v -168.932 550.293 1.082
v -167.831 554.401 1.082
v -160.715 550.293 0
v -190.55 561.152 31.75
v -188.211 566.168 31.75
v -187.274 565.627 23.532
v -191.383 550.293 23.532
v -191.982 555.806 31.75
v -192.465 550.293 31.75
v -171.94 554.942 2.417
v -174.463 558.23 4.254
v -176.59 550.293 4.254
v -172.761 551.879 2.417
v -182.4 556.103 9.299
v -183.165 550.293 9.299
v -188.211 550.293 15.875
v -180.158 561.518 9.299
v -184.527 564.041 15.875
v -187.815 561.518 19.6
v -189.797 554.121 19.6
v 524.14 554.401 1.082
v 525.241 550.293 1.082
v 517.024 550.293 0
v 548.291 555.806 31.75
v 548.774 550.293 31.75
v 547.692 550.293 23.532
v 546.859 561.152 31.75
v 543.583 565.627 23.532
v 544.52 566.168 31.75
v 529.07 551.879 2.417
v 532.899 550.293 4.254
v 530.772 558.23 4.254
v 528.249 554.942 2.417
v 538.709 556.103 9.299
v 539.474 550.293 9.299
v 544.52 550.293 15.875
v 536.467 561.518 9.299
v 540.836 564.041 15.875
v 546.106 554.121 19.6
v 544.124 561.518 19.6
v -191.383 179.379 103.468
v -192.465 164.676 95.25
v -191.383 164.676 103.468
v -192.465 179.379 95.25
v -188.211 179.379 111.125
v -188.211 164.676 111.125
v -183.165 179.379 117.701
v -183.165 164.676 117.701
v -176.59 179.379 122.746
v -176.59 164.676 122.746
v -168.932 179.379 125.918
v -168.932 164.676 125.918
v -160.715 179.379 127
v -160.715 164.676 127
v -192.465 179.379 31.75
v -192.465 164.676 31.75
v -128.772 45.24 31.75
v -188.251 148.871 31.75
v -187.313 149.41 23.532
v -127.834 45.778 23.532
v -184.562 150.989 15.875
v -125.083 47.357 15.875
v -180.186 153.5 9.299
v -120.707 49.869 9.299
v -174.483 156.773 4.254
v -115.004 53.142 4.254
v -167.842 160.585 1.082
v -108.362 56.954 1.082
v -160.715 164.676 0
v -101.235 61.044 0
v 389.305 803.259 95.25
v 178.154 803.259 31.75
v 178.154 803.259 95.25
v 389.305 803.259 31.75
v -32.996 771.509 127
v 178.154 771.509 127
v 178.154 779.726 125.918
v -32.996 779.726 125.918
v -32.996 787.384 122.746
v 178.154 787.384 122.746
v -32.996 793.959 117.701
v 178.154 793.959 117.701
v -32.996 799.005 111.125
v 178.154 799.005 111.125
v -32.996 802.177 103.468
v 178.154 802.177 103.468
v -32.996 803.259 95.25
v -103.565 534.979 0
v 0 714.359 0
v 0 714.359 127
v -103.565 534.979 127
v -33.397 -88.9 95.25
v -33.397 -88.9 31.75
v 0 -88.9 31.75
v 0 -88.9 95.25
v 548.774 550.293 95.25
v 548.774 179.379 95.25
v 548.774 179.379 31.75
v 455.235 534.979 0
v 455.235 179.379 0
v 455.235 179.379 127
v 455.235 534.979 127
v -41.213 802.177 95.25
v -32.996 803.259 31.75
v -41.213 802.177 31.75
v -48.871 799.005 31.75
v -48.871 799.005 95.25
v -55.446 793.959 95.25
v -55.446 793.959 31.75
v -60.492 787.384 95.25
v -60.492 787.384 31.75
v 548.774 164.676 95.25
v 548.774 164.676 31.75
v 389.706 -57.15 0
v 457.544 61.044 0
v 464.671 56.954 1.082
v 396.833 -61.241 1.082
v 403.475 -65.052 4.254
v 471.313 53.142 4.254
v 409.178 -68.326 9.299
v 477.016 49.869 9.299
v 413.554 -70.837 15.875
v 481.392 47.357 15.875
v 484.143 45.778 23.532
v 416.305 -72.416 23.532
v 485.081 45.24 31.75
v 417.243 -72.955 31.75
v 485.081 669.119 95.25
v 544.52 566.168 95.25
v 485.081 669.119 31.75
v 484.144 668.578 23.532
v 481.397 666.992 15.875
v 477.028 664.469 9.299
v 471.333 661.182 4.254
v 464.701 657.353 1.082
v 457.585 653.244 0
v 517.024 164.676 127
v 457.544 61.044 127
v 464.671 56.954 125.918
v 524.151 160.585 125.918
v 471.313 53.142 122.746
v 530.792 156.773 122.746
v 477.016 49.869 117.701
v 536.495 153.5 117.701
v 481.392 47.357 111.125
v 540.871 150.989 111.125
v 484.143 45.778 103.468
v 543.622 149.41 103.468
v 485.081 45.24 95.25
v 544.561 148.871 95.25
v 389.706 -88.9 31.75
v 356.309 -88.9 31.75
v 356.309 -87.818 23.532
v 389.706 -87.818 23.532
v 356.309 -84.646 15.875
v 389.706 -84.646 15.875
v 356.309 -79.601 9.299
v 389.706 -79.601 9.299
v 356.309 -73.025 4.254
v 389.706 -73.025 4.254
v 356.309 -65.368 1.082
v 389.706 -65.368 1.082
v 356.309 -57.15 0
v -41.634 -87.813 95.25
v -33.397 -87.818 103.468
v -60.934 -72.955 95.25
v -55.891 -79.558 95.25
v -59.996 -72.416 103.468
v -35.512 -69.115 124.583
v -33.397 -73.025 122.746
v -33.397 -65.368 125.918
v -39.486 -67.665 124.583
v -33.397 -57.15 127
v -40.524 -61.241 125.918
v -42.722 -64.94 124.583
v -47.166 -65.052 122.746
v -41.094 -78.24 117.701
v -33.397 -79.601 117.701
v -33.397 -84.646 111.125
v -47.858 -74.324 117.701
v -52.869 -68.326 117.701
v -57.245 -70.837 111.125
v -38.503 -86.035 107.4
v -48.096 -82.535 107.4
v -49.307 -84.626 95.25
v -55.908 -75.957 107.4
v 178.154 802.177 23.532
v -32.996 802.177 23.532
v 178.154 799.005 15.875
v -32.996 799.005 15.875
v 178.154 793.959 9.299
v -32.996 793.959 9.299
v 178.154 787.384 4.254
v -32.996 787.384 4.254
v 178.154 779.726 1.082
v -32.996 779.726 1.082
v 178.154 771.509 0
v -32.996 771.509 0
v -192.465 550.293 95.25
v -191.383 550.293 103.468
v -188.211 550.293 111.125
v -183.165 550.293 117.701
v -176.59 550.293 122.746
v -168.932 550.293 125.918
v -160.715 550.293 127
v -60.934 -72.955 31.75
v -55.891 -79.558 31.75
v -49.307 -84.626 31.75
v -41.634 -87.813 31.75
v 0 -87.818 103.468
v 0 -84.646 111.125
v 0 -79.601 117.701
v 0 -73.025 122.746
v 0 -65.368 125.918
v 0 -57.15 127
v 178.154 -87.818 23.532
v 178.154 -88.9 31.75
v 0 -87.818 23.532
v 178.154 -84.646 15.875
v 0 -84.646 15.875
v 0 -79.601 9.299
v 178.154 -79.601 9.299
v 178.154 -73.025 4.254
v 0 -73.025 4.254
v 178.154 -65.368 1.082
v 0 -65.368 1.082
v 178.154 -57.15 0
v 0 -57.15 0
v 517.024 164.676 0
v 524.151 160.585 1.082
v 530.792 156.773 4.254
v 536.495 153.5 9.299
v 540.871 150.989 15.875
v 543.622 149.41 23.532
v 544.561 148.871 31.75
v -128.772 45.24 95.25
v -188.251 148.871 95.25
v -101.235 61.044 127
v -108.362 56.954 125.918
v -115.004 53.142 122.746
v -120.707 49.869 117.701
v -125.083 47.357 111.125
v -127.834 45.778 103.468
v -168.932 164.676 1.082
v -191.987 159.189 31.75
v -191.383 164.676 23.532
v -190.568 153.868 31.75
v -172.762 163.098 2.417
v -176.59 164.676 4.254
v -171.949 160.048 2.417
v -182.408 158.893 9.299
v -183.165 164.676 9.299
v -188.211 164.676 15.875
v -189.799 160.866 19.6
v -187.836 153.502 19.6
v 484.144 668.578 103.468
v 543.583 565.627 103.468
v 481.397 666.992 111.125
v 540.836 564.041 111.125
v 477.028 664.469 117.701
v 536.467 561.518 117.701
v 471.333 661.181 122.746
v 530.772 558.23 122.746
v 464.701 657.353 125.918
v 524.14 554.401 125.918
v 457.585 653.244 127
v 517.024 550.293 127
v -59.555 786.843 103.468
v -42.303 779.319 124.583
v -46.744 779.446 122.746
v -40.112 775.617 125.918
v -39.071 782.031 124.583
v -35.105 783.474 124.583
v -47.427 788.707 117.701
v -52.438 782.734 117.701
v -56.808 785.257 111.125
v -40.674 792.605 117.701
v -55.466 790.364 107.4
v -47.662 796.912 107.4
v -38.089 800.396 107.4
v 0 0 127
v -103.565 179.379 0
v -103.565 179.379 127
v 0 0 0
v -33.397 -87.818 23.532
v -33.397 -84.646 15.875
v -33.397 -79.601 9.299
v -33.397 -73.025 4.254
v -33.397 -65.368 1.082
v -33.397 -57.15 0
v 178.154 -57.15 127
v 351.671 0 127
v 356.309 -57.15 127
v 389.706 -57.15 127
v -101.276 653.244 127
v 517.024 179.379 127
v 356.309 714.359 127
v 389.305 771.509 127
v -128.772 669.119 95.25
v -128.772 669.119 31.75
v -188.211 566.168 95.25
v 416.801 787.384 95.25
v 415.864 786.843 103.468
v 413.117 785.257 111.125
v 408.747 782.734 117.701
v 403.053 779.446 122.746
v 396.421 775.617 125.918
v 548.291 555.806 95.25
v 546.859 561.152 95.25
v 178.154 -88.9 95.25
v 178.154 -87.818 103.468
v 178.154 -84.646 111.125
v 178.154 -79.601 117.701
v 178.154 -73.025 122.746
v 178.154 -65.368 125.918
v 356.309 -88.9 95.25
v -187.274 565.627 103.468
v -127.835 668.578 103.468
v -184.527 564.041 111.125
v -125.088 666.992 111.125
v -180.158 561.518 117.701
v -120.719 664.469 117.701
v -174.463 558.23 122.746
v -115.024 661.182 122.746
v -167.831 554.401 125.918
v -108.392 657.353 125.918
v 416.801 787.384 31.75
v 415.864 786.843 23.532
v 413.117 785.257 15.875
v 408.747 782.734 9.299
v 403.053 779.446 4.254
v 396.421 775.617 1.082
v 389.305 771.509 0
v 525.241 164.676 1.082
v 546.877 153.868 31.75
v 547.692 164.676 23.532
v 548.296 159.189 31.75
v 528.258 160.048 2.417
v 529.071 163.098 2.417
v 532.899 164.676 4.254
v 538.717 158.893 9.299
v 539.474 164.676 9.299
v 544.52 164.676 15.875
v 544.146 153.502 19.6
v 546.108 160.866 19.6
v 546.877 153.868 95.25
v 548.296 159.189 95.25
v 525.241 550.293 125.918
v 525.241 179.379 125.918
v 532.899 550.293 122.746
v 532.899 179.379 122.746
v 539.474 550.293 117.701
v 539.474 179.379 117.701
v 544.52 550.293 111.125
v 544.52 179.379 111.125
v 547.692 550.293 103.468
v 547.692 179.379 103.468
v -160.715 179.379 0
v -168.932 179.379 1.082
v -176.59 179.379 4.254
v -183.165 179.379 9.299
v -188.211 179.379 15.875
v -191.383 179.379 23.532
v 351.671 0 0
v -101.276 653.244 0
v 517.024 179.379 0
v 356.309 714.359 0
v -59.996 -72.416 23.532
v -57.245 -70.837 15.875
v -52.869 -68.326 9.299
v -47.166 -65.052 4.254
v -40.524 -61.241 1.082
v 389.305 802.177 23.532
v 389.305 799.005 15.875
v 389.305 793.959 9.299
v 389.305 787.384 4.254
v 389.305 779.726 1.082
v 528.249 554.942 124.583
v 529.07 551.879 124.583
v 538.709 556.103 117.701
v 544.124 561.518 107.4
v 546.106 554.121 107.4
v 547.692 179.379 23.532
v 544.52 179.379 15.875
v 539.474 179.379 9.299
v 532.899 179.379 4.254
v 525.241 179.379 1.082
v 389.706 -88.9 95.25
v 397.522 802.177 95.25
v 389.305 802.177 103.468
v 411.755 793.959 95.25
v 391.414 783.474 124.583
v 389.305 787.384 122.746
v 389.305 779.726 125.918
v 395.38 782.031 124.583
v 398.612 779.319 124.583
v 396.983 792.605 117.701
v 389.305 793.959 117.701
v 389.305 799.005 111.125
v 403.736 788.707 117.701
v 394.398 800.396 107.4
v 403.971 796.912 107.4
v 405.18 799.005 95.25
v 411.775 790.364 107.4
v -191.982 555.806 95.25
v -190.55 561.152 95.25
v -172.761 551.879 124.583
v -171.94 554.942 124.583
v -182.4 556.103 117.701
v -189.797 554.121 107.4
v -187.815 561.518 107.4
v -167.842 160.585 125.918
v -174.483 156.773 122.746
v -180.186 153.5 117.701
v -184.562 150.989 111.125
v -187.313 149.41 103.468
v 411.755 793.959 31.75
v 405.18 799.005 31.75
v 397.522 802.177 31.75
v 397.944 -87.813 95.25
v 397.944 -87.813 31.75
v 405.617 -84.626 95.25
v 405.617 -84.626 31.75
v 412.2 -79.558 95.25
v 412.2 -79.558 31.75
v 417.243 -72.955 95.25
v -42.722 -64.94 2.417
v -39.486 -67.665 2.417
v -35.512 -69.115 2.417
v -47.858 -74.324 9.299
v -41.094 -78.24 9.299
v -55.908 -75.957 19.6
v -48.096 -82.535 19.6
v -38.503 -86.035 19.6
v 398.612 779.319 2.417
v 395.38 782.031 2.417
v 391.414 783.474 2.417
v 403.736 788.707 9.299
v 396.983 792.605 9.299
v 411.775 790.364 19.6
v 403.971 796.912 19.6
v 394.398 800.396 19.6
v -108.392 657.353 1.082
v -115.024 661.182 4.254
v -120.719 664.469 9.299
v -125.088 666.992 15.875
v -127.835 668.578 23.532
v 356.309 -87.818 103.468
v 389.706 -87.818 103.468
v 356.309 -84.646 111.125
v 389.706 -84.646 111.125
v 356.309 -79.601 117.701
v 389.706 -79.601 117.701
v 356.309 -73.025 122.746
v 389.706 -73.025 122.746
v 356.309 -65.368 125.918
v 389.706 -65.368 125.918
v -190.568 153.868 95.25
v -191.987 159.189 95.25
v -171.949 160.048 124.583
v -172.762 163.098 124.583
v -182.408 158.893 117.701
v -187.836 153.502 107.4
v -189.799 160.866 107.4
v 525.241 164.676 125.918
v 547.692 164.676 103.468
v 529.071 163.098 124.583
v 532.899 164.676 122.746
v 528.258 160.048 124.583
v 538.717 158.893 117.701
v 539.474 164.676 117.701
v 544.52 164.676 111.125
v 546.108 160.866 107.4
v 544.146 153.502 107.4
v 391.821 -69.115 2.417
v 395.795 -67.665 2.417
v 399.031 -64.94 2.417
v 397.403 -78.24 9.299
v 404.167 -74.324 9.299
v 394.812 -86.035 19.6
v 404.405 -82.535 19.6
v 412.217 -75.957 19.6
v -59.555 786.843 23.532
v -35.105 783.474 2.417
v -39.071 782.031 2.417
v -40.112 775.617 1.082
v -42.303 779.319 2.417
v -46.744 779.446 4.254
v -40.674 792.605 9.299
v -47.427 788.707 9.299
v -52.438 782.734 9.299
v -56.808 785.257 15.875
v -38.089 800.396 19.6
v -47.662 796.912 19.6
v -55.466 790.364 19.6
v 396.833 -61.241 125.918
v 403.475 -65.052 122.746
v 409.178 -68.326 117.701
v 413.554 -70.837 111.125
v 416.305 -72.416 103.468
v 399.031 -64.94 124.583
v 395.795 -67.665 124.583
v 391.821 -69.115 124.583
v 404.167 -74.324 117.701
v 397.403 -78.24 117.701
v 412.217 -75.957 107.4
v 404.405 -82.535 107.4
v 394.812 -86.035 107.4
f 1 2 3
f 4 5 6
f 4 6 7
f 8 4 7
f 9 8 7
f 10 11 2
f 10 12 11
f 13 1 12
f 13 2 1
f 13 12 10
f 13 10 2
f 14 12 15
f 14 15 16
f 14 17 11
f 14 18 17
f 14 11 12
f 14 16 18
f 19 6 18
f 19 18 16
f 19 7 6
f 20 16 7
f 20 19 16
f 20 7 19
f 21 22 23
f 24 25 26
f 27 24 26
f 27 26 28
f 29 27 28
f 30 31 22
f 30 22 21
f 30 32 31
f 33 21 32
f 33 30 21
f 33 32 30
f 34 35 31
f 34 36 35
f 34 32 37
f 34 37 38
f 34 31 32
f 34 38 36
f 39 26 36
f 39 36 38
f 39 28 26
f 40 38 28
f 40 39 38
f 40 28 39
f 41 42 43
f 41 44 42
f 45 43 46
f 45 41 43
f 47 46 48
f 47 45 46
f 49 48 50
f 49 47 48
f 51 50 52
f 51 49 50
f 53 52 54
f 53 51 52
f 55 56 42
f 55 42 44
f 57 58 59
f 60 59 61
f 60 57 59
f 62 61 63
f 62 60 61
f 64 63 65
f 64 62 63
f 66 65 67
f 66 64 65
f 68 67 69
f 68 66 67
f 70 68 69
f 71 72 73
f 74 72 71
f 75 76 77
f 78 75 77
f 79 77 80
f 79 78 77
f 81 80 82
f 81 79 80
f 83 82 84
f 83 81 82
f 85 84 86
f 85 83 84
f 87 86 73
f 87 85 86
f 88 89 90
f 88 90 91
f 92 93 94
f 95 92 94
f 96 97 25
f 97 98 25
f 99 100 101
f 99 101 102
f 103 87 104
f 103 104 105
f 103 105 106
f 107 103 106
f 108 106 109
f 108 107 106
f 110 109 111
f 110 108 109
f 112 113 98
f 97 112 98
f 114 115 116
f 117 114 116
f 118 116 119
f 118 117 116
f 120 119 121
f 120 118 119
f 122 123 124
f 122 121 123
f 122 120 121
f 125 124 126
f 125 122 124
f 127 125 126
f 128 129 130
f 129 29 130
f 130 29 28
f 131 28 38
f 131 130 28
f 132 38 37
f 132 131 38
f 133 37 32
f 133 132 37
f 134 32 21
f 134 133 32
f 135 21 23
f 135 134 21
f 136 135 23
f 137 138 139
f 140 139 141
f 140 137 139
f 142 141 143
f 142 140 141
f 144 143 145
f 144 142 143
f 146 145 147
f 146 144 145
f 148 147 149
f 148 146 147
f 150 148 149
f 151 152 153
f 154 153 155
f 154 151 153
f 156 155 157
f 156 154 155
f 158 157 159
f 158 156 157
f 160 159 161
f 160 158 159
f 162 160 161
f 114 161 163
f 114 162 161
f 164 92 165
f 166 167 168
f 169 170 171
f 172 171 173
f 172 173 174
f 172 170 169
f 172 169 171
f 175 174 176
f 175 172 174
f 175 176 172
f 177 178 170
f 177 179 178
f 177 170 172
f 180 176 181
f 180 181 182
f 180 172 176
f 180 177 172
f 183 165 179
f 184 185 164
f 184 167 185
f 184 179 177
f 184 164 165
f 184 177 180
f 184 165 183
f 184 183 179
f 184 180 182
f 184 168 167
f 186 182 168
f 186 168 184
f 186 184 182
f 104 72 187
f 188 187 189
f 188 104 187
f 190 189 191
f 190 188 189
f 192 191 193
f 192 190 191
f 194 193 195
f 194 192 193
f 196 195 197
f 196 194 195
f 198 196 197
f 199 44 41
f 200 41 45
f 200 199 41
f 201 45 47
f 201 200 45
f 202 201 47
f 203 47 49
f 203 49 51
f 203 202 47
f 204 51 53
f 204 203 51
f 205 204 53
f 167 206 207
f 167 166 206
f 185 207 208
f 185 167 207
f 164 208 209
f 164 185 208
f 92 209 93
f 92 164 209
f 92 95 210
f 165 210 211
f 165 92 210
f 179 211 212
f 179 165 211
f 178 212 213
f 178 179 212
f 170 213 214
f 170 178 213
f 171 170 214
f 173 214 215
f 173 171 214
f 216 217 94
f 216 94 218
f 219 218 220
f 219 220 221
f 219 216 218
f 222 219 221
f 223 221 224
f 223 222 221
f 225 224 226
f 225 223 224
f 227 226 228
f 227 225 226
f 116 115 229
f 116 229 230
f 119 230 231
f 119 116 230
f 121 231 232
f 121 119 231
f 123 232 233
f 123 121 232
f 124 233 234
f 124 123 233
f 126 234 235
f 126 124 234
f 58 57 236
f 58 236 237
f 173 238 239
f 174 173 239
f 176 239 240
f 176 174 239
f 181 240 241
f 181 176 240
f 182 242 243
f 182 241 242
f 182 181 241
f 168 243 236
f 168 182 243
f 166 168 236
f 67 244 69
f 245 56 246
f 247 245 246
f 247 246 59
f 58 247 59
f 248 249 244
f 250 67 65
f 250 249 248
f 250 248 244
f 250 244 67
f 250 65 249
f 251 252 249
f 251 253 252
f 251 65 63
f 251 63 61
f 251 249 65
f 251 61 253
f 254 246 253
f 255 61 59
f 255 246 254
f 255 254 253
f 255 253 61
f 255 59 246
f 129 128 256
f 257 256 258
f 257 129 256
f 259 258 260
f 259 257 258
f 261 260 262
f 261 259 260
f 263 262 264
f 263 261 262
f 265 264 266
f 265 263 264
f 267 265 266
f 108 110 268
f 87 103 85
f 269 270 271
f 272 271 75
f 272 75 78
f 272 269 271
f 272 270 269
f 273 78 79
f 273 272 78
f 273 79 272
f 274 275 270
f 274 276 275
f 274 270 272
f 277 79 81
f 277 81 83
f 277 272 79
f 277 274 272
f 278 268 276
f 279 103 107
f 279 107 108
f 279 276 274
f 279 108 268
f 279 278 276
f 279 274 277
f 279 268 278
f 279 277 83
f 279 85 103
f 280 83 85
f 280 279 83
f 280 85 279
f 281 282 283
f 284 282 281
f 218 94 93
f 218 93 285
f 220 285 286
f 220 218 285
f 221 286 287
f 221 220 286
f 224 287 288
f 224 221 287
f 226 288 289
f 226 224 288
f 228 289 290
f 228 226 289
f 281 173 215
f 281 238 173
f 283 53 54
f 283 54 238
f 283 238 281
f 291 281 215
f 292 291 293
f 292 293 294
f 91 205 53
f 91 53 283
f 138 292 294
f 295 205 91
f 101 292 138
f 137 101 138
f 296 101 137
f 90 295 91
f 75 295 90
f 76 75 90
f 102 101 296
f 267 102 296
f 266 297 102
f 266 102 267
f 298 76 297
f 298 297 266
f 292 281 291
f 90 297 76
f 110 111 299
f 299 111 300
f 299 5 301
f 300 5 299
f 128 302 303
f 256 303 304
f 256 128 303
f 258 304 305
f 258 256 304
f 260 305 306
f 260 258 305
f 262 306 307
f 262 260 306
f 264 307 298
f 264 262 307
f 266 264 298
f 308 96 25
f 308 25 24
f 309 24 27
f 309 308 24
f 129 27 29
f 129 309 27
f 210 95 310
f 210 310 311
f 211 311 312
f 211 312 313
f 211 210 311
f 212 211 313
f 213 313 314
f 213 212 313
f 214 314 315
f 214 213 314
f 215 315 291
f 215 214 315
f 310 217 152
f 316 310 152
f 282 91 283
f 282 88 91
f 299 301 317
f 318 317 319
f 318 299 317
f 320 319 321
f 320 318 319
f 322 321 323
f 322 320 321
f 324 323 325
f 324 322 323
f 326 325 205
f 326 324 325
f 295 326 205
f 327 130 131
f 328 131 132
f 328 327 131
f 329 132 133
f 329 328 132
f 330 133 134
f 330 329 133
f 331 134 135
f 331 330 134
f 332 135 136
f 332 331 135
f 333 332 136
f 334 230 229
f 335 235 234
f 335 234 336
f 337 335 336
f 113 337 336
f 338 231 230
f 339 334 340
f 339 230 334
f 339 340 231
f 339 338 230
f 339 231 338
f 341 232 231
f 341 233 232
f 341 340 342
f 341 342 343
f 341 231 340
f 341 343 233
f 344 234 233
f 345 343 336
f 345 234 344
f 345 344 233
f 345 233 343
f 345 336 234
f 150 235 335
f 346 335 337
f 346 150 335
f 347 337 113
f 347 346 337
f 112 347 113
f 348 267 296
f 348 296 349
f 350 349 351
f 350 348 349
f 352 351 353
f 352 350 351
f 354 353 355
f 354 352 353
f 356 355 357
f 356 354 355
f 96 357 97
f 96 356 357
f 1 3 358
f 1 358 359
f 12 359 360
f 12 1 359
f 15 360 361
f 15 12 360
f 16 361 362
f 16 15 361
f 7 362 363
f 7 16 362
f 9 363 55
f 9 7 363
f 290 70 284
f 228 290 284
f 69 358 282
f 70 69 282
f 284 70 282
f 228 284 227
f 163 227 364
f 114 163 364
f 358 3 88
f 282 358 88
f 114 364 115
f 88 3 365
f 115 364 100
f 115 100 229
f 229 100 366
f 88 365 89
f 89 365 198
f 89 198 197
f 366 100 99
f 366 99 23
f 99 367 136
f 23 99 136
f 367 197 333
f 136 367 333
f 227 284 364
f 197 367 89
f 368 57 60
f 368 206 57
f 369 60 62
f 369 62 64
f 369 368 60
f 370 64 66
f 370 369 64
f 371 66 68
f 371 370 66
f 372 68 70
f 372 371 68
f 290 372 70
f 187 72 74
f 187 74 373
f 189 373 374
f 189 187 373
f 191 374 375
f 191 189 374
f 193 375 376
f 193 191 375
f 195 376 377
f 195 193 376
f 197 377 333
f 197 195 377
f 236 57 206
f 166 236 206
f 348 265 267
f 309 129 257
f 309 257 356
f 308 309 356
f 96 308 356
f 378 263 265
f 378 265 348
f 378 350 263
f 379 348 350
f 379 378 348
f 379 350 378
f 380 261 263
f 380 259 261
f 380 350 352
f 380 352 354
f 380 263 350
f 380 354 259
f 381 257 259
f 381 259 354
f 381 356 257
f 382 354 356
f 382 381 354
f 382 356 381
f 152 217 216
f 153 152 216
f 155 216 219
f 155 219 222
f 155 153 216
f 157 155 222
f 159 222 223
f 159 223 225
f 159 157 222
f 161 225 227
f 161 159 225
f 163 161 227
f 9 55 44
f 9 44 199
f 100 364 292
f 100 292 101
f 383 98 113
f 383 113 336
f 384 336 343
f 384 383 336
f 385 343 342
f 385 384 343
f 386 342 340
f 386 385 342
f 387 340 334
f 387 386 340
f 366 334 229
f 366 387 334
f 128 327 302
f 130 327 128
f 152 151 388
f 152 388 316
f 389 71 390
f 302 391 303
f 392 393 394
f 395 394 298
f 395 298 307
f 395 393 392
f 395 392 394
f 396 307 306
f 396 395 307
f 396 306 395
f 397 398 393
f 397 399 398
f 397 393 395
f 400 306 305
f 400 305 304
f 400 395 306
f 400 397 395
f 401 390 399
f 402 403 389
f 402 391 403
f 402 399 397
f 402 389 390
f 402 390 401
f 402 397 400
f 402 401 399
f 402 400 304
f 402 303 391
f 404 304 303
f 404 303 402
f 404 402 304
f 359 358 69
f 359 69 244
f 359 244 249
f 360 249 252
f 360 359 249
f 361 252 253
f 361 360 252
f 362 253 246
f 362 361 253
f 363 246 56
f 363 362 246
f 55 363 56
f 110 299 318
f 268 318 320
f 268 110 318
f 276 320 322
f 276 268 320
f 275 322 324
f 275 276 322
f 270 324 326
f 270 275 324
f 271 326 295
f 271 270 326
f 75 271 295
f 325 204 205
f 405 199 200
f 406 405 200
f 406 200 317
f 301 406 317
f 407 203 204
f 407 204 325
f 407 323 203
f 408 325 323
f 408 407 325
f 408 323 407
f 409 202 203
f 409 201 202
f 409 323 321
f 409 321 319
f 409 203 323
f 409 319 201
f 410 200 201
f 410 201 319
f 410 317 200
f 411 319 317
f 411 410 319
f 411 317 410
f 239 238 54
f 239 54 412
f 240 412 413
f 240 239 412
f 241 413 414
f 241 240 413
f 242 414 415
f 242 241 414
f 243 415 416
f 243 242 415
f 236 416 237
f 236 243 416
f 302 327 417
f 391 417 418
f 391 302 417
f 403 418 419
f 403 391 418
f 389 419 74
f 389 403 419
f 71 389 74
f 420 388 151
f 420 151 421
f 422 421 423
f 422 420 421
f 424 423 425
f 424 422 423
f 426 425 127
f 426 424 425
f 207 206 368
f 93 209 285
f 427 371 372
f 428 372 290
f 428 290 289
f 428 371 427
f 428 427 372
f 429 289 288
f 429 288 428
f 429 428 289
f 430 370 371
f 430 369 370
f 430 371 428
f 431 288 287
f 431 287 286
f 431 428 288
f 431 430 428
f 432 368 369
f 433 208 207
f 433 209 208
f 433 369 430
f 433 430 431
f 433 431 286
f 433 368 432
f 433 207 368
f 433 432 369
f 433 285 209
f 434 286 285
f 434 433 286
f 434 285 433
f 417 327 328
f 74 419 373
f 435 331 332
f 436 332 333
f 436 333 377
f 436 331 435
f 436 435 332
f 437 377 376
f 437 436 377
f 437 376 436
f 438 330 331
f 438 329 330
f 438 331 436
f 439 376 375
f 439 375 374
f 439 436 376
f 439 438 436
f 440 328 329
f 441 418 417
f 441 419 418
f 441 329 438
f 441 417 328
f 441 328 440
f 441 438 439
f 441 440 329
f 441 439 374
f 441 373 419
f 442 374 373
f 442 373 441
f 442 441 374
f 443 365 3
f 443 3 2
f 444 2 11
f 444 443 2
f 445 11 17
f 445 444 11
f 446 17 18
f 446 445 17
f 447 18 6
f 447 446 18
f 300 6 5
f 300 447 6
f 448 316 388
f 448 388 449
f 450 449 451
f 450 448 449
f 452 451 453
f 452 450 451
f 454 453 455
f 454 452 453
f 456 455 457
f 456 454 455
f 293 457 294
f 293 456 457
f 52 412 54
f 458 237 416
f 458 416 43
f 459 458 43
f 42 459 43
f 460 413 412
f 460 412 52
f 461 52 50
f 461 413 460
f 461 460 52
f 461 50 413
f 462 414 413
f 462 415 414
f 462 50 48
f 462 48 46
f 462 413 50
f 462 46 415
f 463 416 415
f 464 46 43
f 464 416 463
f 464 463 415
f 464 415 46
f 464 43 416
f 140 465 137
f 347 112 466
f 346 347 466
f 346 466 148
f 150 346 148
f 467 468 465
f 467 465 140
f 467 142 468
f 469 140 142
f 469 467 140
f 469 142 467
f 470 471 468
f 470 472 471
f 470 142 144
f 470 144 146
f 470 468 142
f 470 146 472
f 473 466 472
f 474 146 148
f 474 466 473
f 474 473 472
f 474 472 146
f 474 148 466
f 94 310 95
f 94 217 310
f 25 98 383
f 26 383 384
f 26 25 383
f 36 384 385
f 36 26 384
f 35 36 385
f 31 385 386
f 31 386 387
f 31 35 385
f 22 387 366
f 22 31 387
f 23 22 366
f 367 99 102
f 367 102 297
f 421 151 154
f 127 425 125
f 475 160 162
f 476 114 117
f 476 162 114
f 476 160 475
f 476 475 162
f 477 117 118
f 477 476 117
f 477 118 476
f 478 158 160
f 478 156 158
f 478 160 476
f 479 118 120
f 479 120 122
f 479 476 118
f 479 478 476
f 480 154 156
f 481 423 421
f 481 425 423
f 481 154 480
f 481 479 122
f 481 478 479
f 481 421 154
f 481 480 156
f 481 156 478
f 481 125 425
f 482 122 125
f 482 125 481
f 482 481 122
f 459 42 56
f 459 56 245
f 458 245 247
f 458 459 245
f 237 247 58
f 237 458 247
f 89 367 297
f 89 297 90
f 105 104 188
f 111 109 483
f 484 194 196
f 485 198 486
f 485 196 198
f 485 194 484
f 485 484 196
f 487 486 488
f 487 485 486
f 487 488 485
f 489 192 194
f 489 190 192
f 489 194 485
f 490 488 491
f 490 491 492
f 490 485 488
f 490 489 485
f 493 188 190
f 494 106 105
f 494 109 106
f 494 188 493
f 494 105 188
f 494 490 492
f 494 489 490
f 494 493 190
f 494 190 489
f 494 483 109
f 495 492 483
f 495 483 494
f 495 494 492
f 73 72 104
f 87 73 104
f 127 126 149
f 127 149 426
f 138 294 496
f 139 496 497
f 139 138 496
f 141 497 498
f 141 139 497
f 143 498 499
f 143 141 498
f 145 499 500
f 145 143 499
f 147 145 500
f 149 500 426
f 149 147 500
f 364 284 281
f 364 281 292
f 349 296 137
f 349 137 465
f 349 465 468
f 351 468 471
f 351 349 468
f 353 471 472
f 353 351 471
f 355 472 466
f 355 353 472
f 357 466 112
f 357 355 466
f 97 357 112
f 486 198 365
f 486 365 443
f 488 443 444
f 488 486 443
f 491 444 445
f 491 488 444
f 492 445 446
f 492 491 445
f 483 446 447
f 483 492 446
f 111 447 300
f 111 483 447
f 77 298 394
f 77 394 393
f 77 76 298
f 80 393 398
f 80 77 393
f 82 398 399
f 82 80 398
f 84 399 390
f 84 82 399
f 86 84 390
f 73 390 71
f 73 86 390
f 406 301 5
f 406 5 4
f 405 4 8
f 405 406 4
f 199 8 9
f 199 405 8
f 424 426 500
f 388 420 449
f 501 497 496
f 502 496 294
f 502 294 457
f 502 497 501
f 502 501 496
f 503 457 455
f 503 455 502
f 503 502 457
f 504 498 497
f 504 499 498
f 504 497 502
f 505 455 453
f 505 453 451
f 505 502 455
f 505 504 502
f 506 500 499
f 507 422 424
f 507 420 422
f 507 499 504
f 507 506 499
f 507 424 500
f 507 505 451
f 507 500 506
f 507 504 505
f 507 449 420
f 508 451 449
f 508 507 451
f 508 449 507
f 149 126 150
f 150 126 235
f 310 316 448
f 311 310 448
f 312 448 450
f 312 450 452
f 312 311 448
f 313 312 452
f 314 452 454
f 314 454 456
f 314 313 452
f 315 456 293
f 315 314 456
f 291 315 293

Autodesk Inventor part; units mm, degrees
ref_plane "YZ Plane" through (0, 0, 0) normal (1, 0, 0) x (0, 1, 0)
ref_plane "XZ Plane" through (0, 0, 0) normal (0, 1, 0) x (-1, 0, 0)
ref_plane "XY Plane" through (0, 0, 0) normal (0, 0, 1) x (1, 0, 0)
sketch "Sketch1" plane through (0, 0, 0) normal (0, 0, 1) x (1, 0, 0)
  line L0 (0, 0) -> (351.6706, 0)
  line L1 (-103.5647, 179.3793) -> (0, 0)
  line L2 (351.6706, 0) -> (455.2353, 179.3793)
  line L3 (455.2353, 179.3793) -> (455.2353, 534.9793)
  line L4 (-103.5647, 534.9793) -> (-103.5647, 179.3793)
  line L5 (0, 714.3586) -> (-103.5647, 534.9793)
  line L6 (356.3091, 714.3586) -> (0, 714.3586)
  line L7 (455.2353, 534.9793) -> (356.3091, 714.3586)
  line L8 (-103.5647, 179.3793) -> (-192.4647, 179.3793) construction
  line L9 (-51.7823, 89.6897) -> (-128.772, 45.2397) construction
  line L10 (-128.772, 45.2397) -> (-51.7823, -88.9)
  line L11 (-51.7823, -88.9) -> (0, -88.9)
  line L12 (178.1545, -88.9) -> (178.1545, 714.3586) construction
  line L13 (178.1545, -88.9) -> (0, -88.9)
  line L14 (-128.772, 45.2397) -> (-192.4647, 156.2119)
  line L15 (-192.4647, 156.2119) -> (-192.4647, 179.3793)
  line L16 (178.1545, 714.3586) -> (178.1545, 803.2586) construction
  line L17 (-51.7823, 624.669) -> (-128.772, 669.119) construction
  line L18 (-192.4647, 179.3793) -> (-192.4647, 558.8)
  line L19 (-192.4647, 558.8) -> (-128.772, 669.119)
  line L20 (178.1545, 803.2586) -> (-51.3264, 803.2586)
  line L21 (-51.3264, 803.2586) -> (-128.772, 669.119)
  line L22 (485.0811, 45.2397) -> (408.0914, -88.9)
  line L23 (178.1545, -88.9) -> (356.3091, -88.9)
  line L24 (485.0811, 45.2397) -> (548.7738, 156.2119)
  line L25 (548.7738, 156.2119) -> (548.7738, 179.3793)
  line L26 (408.0914, 624.669) -> (485.0811, 669.119) construction
  line L27 (548.7738, 179.3793) -> (548.7738, 558.8)
  line L28 (548.7738, 558.8) -> (485.0811, 669.119)
  line L29 (178.1545, 803.2586) -> (407.6355, 803.2586)
  line L30 (407.6355, 803.2586) -> (485.0811, 669.119)
  line L31 (408.0914, -88.9) -> (356.3091, -88.9)
  point P0 (175.8353, 357.1793)
  dimension "d0" = 88.9
  dimension "d1" = 88.9
  dimension "d2" = 88.9
  dimension "d3" = 88.9
  dimension "d4" = 88.9
  dimension "d8" = 88.9
extrude "Extrusion1" add sketch "Sketch1" along normal blind 127
fillet "Fillet1" radius 31.75 24 edges at (63.414, 803.2586, 127) (446.3583, 736.1888, 127) (548.7738, 369.0897, 127) (516.9274, 100.7258, 127) (89.0773, -88.9, 127) (-90.2772, -21.8302, 127) (-192.4647, 167.7956, 127) (-160.6184, 613.9595, 127) (548.7738, 369.0897, 0) (516.9274, 613.9595, 0) (63.414, 803.2586, 0) (-160.6184, 613.9595, 0) (-192.4647, 167.7956, 0) (-90.2772, -21.8302, 0) (-25.8912, -88.9, 0) (446.5863, -21.8302, 0) (548.7738, 156.2119, 63.5) (548.7738, 558.8, 63.5) (407.6355, 803.2586, 63.5) (-51.3264, 803.2586, 63.5) (-192.4647, 558.8, 63.5) (-192.4647, 156.2119, 63.5) (-51.7823, -88.9, 63.5) (408.0914, -88.9, 63.5)
properties part number "Bumpers"
